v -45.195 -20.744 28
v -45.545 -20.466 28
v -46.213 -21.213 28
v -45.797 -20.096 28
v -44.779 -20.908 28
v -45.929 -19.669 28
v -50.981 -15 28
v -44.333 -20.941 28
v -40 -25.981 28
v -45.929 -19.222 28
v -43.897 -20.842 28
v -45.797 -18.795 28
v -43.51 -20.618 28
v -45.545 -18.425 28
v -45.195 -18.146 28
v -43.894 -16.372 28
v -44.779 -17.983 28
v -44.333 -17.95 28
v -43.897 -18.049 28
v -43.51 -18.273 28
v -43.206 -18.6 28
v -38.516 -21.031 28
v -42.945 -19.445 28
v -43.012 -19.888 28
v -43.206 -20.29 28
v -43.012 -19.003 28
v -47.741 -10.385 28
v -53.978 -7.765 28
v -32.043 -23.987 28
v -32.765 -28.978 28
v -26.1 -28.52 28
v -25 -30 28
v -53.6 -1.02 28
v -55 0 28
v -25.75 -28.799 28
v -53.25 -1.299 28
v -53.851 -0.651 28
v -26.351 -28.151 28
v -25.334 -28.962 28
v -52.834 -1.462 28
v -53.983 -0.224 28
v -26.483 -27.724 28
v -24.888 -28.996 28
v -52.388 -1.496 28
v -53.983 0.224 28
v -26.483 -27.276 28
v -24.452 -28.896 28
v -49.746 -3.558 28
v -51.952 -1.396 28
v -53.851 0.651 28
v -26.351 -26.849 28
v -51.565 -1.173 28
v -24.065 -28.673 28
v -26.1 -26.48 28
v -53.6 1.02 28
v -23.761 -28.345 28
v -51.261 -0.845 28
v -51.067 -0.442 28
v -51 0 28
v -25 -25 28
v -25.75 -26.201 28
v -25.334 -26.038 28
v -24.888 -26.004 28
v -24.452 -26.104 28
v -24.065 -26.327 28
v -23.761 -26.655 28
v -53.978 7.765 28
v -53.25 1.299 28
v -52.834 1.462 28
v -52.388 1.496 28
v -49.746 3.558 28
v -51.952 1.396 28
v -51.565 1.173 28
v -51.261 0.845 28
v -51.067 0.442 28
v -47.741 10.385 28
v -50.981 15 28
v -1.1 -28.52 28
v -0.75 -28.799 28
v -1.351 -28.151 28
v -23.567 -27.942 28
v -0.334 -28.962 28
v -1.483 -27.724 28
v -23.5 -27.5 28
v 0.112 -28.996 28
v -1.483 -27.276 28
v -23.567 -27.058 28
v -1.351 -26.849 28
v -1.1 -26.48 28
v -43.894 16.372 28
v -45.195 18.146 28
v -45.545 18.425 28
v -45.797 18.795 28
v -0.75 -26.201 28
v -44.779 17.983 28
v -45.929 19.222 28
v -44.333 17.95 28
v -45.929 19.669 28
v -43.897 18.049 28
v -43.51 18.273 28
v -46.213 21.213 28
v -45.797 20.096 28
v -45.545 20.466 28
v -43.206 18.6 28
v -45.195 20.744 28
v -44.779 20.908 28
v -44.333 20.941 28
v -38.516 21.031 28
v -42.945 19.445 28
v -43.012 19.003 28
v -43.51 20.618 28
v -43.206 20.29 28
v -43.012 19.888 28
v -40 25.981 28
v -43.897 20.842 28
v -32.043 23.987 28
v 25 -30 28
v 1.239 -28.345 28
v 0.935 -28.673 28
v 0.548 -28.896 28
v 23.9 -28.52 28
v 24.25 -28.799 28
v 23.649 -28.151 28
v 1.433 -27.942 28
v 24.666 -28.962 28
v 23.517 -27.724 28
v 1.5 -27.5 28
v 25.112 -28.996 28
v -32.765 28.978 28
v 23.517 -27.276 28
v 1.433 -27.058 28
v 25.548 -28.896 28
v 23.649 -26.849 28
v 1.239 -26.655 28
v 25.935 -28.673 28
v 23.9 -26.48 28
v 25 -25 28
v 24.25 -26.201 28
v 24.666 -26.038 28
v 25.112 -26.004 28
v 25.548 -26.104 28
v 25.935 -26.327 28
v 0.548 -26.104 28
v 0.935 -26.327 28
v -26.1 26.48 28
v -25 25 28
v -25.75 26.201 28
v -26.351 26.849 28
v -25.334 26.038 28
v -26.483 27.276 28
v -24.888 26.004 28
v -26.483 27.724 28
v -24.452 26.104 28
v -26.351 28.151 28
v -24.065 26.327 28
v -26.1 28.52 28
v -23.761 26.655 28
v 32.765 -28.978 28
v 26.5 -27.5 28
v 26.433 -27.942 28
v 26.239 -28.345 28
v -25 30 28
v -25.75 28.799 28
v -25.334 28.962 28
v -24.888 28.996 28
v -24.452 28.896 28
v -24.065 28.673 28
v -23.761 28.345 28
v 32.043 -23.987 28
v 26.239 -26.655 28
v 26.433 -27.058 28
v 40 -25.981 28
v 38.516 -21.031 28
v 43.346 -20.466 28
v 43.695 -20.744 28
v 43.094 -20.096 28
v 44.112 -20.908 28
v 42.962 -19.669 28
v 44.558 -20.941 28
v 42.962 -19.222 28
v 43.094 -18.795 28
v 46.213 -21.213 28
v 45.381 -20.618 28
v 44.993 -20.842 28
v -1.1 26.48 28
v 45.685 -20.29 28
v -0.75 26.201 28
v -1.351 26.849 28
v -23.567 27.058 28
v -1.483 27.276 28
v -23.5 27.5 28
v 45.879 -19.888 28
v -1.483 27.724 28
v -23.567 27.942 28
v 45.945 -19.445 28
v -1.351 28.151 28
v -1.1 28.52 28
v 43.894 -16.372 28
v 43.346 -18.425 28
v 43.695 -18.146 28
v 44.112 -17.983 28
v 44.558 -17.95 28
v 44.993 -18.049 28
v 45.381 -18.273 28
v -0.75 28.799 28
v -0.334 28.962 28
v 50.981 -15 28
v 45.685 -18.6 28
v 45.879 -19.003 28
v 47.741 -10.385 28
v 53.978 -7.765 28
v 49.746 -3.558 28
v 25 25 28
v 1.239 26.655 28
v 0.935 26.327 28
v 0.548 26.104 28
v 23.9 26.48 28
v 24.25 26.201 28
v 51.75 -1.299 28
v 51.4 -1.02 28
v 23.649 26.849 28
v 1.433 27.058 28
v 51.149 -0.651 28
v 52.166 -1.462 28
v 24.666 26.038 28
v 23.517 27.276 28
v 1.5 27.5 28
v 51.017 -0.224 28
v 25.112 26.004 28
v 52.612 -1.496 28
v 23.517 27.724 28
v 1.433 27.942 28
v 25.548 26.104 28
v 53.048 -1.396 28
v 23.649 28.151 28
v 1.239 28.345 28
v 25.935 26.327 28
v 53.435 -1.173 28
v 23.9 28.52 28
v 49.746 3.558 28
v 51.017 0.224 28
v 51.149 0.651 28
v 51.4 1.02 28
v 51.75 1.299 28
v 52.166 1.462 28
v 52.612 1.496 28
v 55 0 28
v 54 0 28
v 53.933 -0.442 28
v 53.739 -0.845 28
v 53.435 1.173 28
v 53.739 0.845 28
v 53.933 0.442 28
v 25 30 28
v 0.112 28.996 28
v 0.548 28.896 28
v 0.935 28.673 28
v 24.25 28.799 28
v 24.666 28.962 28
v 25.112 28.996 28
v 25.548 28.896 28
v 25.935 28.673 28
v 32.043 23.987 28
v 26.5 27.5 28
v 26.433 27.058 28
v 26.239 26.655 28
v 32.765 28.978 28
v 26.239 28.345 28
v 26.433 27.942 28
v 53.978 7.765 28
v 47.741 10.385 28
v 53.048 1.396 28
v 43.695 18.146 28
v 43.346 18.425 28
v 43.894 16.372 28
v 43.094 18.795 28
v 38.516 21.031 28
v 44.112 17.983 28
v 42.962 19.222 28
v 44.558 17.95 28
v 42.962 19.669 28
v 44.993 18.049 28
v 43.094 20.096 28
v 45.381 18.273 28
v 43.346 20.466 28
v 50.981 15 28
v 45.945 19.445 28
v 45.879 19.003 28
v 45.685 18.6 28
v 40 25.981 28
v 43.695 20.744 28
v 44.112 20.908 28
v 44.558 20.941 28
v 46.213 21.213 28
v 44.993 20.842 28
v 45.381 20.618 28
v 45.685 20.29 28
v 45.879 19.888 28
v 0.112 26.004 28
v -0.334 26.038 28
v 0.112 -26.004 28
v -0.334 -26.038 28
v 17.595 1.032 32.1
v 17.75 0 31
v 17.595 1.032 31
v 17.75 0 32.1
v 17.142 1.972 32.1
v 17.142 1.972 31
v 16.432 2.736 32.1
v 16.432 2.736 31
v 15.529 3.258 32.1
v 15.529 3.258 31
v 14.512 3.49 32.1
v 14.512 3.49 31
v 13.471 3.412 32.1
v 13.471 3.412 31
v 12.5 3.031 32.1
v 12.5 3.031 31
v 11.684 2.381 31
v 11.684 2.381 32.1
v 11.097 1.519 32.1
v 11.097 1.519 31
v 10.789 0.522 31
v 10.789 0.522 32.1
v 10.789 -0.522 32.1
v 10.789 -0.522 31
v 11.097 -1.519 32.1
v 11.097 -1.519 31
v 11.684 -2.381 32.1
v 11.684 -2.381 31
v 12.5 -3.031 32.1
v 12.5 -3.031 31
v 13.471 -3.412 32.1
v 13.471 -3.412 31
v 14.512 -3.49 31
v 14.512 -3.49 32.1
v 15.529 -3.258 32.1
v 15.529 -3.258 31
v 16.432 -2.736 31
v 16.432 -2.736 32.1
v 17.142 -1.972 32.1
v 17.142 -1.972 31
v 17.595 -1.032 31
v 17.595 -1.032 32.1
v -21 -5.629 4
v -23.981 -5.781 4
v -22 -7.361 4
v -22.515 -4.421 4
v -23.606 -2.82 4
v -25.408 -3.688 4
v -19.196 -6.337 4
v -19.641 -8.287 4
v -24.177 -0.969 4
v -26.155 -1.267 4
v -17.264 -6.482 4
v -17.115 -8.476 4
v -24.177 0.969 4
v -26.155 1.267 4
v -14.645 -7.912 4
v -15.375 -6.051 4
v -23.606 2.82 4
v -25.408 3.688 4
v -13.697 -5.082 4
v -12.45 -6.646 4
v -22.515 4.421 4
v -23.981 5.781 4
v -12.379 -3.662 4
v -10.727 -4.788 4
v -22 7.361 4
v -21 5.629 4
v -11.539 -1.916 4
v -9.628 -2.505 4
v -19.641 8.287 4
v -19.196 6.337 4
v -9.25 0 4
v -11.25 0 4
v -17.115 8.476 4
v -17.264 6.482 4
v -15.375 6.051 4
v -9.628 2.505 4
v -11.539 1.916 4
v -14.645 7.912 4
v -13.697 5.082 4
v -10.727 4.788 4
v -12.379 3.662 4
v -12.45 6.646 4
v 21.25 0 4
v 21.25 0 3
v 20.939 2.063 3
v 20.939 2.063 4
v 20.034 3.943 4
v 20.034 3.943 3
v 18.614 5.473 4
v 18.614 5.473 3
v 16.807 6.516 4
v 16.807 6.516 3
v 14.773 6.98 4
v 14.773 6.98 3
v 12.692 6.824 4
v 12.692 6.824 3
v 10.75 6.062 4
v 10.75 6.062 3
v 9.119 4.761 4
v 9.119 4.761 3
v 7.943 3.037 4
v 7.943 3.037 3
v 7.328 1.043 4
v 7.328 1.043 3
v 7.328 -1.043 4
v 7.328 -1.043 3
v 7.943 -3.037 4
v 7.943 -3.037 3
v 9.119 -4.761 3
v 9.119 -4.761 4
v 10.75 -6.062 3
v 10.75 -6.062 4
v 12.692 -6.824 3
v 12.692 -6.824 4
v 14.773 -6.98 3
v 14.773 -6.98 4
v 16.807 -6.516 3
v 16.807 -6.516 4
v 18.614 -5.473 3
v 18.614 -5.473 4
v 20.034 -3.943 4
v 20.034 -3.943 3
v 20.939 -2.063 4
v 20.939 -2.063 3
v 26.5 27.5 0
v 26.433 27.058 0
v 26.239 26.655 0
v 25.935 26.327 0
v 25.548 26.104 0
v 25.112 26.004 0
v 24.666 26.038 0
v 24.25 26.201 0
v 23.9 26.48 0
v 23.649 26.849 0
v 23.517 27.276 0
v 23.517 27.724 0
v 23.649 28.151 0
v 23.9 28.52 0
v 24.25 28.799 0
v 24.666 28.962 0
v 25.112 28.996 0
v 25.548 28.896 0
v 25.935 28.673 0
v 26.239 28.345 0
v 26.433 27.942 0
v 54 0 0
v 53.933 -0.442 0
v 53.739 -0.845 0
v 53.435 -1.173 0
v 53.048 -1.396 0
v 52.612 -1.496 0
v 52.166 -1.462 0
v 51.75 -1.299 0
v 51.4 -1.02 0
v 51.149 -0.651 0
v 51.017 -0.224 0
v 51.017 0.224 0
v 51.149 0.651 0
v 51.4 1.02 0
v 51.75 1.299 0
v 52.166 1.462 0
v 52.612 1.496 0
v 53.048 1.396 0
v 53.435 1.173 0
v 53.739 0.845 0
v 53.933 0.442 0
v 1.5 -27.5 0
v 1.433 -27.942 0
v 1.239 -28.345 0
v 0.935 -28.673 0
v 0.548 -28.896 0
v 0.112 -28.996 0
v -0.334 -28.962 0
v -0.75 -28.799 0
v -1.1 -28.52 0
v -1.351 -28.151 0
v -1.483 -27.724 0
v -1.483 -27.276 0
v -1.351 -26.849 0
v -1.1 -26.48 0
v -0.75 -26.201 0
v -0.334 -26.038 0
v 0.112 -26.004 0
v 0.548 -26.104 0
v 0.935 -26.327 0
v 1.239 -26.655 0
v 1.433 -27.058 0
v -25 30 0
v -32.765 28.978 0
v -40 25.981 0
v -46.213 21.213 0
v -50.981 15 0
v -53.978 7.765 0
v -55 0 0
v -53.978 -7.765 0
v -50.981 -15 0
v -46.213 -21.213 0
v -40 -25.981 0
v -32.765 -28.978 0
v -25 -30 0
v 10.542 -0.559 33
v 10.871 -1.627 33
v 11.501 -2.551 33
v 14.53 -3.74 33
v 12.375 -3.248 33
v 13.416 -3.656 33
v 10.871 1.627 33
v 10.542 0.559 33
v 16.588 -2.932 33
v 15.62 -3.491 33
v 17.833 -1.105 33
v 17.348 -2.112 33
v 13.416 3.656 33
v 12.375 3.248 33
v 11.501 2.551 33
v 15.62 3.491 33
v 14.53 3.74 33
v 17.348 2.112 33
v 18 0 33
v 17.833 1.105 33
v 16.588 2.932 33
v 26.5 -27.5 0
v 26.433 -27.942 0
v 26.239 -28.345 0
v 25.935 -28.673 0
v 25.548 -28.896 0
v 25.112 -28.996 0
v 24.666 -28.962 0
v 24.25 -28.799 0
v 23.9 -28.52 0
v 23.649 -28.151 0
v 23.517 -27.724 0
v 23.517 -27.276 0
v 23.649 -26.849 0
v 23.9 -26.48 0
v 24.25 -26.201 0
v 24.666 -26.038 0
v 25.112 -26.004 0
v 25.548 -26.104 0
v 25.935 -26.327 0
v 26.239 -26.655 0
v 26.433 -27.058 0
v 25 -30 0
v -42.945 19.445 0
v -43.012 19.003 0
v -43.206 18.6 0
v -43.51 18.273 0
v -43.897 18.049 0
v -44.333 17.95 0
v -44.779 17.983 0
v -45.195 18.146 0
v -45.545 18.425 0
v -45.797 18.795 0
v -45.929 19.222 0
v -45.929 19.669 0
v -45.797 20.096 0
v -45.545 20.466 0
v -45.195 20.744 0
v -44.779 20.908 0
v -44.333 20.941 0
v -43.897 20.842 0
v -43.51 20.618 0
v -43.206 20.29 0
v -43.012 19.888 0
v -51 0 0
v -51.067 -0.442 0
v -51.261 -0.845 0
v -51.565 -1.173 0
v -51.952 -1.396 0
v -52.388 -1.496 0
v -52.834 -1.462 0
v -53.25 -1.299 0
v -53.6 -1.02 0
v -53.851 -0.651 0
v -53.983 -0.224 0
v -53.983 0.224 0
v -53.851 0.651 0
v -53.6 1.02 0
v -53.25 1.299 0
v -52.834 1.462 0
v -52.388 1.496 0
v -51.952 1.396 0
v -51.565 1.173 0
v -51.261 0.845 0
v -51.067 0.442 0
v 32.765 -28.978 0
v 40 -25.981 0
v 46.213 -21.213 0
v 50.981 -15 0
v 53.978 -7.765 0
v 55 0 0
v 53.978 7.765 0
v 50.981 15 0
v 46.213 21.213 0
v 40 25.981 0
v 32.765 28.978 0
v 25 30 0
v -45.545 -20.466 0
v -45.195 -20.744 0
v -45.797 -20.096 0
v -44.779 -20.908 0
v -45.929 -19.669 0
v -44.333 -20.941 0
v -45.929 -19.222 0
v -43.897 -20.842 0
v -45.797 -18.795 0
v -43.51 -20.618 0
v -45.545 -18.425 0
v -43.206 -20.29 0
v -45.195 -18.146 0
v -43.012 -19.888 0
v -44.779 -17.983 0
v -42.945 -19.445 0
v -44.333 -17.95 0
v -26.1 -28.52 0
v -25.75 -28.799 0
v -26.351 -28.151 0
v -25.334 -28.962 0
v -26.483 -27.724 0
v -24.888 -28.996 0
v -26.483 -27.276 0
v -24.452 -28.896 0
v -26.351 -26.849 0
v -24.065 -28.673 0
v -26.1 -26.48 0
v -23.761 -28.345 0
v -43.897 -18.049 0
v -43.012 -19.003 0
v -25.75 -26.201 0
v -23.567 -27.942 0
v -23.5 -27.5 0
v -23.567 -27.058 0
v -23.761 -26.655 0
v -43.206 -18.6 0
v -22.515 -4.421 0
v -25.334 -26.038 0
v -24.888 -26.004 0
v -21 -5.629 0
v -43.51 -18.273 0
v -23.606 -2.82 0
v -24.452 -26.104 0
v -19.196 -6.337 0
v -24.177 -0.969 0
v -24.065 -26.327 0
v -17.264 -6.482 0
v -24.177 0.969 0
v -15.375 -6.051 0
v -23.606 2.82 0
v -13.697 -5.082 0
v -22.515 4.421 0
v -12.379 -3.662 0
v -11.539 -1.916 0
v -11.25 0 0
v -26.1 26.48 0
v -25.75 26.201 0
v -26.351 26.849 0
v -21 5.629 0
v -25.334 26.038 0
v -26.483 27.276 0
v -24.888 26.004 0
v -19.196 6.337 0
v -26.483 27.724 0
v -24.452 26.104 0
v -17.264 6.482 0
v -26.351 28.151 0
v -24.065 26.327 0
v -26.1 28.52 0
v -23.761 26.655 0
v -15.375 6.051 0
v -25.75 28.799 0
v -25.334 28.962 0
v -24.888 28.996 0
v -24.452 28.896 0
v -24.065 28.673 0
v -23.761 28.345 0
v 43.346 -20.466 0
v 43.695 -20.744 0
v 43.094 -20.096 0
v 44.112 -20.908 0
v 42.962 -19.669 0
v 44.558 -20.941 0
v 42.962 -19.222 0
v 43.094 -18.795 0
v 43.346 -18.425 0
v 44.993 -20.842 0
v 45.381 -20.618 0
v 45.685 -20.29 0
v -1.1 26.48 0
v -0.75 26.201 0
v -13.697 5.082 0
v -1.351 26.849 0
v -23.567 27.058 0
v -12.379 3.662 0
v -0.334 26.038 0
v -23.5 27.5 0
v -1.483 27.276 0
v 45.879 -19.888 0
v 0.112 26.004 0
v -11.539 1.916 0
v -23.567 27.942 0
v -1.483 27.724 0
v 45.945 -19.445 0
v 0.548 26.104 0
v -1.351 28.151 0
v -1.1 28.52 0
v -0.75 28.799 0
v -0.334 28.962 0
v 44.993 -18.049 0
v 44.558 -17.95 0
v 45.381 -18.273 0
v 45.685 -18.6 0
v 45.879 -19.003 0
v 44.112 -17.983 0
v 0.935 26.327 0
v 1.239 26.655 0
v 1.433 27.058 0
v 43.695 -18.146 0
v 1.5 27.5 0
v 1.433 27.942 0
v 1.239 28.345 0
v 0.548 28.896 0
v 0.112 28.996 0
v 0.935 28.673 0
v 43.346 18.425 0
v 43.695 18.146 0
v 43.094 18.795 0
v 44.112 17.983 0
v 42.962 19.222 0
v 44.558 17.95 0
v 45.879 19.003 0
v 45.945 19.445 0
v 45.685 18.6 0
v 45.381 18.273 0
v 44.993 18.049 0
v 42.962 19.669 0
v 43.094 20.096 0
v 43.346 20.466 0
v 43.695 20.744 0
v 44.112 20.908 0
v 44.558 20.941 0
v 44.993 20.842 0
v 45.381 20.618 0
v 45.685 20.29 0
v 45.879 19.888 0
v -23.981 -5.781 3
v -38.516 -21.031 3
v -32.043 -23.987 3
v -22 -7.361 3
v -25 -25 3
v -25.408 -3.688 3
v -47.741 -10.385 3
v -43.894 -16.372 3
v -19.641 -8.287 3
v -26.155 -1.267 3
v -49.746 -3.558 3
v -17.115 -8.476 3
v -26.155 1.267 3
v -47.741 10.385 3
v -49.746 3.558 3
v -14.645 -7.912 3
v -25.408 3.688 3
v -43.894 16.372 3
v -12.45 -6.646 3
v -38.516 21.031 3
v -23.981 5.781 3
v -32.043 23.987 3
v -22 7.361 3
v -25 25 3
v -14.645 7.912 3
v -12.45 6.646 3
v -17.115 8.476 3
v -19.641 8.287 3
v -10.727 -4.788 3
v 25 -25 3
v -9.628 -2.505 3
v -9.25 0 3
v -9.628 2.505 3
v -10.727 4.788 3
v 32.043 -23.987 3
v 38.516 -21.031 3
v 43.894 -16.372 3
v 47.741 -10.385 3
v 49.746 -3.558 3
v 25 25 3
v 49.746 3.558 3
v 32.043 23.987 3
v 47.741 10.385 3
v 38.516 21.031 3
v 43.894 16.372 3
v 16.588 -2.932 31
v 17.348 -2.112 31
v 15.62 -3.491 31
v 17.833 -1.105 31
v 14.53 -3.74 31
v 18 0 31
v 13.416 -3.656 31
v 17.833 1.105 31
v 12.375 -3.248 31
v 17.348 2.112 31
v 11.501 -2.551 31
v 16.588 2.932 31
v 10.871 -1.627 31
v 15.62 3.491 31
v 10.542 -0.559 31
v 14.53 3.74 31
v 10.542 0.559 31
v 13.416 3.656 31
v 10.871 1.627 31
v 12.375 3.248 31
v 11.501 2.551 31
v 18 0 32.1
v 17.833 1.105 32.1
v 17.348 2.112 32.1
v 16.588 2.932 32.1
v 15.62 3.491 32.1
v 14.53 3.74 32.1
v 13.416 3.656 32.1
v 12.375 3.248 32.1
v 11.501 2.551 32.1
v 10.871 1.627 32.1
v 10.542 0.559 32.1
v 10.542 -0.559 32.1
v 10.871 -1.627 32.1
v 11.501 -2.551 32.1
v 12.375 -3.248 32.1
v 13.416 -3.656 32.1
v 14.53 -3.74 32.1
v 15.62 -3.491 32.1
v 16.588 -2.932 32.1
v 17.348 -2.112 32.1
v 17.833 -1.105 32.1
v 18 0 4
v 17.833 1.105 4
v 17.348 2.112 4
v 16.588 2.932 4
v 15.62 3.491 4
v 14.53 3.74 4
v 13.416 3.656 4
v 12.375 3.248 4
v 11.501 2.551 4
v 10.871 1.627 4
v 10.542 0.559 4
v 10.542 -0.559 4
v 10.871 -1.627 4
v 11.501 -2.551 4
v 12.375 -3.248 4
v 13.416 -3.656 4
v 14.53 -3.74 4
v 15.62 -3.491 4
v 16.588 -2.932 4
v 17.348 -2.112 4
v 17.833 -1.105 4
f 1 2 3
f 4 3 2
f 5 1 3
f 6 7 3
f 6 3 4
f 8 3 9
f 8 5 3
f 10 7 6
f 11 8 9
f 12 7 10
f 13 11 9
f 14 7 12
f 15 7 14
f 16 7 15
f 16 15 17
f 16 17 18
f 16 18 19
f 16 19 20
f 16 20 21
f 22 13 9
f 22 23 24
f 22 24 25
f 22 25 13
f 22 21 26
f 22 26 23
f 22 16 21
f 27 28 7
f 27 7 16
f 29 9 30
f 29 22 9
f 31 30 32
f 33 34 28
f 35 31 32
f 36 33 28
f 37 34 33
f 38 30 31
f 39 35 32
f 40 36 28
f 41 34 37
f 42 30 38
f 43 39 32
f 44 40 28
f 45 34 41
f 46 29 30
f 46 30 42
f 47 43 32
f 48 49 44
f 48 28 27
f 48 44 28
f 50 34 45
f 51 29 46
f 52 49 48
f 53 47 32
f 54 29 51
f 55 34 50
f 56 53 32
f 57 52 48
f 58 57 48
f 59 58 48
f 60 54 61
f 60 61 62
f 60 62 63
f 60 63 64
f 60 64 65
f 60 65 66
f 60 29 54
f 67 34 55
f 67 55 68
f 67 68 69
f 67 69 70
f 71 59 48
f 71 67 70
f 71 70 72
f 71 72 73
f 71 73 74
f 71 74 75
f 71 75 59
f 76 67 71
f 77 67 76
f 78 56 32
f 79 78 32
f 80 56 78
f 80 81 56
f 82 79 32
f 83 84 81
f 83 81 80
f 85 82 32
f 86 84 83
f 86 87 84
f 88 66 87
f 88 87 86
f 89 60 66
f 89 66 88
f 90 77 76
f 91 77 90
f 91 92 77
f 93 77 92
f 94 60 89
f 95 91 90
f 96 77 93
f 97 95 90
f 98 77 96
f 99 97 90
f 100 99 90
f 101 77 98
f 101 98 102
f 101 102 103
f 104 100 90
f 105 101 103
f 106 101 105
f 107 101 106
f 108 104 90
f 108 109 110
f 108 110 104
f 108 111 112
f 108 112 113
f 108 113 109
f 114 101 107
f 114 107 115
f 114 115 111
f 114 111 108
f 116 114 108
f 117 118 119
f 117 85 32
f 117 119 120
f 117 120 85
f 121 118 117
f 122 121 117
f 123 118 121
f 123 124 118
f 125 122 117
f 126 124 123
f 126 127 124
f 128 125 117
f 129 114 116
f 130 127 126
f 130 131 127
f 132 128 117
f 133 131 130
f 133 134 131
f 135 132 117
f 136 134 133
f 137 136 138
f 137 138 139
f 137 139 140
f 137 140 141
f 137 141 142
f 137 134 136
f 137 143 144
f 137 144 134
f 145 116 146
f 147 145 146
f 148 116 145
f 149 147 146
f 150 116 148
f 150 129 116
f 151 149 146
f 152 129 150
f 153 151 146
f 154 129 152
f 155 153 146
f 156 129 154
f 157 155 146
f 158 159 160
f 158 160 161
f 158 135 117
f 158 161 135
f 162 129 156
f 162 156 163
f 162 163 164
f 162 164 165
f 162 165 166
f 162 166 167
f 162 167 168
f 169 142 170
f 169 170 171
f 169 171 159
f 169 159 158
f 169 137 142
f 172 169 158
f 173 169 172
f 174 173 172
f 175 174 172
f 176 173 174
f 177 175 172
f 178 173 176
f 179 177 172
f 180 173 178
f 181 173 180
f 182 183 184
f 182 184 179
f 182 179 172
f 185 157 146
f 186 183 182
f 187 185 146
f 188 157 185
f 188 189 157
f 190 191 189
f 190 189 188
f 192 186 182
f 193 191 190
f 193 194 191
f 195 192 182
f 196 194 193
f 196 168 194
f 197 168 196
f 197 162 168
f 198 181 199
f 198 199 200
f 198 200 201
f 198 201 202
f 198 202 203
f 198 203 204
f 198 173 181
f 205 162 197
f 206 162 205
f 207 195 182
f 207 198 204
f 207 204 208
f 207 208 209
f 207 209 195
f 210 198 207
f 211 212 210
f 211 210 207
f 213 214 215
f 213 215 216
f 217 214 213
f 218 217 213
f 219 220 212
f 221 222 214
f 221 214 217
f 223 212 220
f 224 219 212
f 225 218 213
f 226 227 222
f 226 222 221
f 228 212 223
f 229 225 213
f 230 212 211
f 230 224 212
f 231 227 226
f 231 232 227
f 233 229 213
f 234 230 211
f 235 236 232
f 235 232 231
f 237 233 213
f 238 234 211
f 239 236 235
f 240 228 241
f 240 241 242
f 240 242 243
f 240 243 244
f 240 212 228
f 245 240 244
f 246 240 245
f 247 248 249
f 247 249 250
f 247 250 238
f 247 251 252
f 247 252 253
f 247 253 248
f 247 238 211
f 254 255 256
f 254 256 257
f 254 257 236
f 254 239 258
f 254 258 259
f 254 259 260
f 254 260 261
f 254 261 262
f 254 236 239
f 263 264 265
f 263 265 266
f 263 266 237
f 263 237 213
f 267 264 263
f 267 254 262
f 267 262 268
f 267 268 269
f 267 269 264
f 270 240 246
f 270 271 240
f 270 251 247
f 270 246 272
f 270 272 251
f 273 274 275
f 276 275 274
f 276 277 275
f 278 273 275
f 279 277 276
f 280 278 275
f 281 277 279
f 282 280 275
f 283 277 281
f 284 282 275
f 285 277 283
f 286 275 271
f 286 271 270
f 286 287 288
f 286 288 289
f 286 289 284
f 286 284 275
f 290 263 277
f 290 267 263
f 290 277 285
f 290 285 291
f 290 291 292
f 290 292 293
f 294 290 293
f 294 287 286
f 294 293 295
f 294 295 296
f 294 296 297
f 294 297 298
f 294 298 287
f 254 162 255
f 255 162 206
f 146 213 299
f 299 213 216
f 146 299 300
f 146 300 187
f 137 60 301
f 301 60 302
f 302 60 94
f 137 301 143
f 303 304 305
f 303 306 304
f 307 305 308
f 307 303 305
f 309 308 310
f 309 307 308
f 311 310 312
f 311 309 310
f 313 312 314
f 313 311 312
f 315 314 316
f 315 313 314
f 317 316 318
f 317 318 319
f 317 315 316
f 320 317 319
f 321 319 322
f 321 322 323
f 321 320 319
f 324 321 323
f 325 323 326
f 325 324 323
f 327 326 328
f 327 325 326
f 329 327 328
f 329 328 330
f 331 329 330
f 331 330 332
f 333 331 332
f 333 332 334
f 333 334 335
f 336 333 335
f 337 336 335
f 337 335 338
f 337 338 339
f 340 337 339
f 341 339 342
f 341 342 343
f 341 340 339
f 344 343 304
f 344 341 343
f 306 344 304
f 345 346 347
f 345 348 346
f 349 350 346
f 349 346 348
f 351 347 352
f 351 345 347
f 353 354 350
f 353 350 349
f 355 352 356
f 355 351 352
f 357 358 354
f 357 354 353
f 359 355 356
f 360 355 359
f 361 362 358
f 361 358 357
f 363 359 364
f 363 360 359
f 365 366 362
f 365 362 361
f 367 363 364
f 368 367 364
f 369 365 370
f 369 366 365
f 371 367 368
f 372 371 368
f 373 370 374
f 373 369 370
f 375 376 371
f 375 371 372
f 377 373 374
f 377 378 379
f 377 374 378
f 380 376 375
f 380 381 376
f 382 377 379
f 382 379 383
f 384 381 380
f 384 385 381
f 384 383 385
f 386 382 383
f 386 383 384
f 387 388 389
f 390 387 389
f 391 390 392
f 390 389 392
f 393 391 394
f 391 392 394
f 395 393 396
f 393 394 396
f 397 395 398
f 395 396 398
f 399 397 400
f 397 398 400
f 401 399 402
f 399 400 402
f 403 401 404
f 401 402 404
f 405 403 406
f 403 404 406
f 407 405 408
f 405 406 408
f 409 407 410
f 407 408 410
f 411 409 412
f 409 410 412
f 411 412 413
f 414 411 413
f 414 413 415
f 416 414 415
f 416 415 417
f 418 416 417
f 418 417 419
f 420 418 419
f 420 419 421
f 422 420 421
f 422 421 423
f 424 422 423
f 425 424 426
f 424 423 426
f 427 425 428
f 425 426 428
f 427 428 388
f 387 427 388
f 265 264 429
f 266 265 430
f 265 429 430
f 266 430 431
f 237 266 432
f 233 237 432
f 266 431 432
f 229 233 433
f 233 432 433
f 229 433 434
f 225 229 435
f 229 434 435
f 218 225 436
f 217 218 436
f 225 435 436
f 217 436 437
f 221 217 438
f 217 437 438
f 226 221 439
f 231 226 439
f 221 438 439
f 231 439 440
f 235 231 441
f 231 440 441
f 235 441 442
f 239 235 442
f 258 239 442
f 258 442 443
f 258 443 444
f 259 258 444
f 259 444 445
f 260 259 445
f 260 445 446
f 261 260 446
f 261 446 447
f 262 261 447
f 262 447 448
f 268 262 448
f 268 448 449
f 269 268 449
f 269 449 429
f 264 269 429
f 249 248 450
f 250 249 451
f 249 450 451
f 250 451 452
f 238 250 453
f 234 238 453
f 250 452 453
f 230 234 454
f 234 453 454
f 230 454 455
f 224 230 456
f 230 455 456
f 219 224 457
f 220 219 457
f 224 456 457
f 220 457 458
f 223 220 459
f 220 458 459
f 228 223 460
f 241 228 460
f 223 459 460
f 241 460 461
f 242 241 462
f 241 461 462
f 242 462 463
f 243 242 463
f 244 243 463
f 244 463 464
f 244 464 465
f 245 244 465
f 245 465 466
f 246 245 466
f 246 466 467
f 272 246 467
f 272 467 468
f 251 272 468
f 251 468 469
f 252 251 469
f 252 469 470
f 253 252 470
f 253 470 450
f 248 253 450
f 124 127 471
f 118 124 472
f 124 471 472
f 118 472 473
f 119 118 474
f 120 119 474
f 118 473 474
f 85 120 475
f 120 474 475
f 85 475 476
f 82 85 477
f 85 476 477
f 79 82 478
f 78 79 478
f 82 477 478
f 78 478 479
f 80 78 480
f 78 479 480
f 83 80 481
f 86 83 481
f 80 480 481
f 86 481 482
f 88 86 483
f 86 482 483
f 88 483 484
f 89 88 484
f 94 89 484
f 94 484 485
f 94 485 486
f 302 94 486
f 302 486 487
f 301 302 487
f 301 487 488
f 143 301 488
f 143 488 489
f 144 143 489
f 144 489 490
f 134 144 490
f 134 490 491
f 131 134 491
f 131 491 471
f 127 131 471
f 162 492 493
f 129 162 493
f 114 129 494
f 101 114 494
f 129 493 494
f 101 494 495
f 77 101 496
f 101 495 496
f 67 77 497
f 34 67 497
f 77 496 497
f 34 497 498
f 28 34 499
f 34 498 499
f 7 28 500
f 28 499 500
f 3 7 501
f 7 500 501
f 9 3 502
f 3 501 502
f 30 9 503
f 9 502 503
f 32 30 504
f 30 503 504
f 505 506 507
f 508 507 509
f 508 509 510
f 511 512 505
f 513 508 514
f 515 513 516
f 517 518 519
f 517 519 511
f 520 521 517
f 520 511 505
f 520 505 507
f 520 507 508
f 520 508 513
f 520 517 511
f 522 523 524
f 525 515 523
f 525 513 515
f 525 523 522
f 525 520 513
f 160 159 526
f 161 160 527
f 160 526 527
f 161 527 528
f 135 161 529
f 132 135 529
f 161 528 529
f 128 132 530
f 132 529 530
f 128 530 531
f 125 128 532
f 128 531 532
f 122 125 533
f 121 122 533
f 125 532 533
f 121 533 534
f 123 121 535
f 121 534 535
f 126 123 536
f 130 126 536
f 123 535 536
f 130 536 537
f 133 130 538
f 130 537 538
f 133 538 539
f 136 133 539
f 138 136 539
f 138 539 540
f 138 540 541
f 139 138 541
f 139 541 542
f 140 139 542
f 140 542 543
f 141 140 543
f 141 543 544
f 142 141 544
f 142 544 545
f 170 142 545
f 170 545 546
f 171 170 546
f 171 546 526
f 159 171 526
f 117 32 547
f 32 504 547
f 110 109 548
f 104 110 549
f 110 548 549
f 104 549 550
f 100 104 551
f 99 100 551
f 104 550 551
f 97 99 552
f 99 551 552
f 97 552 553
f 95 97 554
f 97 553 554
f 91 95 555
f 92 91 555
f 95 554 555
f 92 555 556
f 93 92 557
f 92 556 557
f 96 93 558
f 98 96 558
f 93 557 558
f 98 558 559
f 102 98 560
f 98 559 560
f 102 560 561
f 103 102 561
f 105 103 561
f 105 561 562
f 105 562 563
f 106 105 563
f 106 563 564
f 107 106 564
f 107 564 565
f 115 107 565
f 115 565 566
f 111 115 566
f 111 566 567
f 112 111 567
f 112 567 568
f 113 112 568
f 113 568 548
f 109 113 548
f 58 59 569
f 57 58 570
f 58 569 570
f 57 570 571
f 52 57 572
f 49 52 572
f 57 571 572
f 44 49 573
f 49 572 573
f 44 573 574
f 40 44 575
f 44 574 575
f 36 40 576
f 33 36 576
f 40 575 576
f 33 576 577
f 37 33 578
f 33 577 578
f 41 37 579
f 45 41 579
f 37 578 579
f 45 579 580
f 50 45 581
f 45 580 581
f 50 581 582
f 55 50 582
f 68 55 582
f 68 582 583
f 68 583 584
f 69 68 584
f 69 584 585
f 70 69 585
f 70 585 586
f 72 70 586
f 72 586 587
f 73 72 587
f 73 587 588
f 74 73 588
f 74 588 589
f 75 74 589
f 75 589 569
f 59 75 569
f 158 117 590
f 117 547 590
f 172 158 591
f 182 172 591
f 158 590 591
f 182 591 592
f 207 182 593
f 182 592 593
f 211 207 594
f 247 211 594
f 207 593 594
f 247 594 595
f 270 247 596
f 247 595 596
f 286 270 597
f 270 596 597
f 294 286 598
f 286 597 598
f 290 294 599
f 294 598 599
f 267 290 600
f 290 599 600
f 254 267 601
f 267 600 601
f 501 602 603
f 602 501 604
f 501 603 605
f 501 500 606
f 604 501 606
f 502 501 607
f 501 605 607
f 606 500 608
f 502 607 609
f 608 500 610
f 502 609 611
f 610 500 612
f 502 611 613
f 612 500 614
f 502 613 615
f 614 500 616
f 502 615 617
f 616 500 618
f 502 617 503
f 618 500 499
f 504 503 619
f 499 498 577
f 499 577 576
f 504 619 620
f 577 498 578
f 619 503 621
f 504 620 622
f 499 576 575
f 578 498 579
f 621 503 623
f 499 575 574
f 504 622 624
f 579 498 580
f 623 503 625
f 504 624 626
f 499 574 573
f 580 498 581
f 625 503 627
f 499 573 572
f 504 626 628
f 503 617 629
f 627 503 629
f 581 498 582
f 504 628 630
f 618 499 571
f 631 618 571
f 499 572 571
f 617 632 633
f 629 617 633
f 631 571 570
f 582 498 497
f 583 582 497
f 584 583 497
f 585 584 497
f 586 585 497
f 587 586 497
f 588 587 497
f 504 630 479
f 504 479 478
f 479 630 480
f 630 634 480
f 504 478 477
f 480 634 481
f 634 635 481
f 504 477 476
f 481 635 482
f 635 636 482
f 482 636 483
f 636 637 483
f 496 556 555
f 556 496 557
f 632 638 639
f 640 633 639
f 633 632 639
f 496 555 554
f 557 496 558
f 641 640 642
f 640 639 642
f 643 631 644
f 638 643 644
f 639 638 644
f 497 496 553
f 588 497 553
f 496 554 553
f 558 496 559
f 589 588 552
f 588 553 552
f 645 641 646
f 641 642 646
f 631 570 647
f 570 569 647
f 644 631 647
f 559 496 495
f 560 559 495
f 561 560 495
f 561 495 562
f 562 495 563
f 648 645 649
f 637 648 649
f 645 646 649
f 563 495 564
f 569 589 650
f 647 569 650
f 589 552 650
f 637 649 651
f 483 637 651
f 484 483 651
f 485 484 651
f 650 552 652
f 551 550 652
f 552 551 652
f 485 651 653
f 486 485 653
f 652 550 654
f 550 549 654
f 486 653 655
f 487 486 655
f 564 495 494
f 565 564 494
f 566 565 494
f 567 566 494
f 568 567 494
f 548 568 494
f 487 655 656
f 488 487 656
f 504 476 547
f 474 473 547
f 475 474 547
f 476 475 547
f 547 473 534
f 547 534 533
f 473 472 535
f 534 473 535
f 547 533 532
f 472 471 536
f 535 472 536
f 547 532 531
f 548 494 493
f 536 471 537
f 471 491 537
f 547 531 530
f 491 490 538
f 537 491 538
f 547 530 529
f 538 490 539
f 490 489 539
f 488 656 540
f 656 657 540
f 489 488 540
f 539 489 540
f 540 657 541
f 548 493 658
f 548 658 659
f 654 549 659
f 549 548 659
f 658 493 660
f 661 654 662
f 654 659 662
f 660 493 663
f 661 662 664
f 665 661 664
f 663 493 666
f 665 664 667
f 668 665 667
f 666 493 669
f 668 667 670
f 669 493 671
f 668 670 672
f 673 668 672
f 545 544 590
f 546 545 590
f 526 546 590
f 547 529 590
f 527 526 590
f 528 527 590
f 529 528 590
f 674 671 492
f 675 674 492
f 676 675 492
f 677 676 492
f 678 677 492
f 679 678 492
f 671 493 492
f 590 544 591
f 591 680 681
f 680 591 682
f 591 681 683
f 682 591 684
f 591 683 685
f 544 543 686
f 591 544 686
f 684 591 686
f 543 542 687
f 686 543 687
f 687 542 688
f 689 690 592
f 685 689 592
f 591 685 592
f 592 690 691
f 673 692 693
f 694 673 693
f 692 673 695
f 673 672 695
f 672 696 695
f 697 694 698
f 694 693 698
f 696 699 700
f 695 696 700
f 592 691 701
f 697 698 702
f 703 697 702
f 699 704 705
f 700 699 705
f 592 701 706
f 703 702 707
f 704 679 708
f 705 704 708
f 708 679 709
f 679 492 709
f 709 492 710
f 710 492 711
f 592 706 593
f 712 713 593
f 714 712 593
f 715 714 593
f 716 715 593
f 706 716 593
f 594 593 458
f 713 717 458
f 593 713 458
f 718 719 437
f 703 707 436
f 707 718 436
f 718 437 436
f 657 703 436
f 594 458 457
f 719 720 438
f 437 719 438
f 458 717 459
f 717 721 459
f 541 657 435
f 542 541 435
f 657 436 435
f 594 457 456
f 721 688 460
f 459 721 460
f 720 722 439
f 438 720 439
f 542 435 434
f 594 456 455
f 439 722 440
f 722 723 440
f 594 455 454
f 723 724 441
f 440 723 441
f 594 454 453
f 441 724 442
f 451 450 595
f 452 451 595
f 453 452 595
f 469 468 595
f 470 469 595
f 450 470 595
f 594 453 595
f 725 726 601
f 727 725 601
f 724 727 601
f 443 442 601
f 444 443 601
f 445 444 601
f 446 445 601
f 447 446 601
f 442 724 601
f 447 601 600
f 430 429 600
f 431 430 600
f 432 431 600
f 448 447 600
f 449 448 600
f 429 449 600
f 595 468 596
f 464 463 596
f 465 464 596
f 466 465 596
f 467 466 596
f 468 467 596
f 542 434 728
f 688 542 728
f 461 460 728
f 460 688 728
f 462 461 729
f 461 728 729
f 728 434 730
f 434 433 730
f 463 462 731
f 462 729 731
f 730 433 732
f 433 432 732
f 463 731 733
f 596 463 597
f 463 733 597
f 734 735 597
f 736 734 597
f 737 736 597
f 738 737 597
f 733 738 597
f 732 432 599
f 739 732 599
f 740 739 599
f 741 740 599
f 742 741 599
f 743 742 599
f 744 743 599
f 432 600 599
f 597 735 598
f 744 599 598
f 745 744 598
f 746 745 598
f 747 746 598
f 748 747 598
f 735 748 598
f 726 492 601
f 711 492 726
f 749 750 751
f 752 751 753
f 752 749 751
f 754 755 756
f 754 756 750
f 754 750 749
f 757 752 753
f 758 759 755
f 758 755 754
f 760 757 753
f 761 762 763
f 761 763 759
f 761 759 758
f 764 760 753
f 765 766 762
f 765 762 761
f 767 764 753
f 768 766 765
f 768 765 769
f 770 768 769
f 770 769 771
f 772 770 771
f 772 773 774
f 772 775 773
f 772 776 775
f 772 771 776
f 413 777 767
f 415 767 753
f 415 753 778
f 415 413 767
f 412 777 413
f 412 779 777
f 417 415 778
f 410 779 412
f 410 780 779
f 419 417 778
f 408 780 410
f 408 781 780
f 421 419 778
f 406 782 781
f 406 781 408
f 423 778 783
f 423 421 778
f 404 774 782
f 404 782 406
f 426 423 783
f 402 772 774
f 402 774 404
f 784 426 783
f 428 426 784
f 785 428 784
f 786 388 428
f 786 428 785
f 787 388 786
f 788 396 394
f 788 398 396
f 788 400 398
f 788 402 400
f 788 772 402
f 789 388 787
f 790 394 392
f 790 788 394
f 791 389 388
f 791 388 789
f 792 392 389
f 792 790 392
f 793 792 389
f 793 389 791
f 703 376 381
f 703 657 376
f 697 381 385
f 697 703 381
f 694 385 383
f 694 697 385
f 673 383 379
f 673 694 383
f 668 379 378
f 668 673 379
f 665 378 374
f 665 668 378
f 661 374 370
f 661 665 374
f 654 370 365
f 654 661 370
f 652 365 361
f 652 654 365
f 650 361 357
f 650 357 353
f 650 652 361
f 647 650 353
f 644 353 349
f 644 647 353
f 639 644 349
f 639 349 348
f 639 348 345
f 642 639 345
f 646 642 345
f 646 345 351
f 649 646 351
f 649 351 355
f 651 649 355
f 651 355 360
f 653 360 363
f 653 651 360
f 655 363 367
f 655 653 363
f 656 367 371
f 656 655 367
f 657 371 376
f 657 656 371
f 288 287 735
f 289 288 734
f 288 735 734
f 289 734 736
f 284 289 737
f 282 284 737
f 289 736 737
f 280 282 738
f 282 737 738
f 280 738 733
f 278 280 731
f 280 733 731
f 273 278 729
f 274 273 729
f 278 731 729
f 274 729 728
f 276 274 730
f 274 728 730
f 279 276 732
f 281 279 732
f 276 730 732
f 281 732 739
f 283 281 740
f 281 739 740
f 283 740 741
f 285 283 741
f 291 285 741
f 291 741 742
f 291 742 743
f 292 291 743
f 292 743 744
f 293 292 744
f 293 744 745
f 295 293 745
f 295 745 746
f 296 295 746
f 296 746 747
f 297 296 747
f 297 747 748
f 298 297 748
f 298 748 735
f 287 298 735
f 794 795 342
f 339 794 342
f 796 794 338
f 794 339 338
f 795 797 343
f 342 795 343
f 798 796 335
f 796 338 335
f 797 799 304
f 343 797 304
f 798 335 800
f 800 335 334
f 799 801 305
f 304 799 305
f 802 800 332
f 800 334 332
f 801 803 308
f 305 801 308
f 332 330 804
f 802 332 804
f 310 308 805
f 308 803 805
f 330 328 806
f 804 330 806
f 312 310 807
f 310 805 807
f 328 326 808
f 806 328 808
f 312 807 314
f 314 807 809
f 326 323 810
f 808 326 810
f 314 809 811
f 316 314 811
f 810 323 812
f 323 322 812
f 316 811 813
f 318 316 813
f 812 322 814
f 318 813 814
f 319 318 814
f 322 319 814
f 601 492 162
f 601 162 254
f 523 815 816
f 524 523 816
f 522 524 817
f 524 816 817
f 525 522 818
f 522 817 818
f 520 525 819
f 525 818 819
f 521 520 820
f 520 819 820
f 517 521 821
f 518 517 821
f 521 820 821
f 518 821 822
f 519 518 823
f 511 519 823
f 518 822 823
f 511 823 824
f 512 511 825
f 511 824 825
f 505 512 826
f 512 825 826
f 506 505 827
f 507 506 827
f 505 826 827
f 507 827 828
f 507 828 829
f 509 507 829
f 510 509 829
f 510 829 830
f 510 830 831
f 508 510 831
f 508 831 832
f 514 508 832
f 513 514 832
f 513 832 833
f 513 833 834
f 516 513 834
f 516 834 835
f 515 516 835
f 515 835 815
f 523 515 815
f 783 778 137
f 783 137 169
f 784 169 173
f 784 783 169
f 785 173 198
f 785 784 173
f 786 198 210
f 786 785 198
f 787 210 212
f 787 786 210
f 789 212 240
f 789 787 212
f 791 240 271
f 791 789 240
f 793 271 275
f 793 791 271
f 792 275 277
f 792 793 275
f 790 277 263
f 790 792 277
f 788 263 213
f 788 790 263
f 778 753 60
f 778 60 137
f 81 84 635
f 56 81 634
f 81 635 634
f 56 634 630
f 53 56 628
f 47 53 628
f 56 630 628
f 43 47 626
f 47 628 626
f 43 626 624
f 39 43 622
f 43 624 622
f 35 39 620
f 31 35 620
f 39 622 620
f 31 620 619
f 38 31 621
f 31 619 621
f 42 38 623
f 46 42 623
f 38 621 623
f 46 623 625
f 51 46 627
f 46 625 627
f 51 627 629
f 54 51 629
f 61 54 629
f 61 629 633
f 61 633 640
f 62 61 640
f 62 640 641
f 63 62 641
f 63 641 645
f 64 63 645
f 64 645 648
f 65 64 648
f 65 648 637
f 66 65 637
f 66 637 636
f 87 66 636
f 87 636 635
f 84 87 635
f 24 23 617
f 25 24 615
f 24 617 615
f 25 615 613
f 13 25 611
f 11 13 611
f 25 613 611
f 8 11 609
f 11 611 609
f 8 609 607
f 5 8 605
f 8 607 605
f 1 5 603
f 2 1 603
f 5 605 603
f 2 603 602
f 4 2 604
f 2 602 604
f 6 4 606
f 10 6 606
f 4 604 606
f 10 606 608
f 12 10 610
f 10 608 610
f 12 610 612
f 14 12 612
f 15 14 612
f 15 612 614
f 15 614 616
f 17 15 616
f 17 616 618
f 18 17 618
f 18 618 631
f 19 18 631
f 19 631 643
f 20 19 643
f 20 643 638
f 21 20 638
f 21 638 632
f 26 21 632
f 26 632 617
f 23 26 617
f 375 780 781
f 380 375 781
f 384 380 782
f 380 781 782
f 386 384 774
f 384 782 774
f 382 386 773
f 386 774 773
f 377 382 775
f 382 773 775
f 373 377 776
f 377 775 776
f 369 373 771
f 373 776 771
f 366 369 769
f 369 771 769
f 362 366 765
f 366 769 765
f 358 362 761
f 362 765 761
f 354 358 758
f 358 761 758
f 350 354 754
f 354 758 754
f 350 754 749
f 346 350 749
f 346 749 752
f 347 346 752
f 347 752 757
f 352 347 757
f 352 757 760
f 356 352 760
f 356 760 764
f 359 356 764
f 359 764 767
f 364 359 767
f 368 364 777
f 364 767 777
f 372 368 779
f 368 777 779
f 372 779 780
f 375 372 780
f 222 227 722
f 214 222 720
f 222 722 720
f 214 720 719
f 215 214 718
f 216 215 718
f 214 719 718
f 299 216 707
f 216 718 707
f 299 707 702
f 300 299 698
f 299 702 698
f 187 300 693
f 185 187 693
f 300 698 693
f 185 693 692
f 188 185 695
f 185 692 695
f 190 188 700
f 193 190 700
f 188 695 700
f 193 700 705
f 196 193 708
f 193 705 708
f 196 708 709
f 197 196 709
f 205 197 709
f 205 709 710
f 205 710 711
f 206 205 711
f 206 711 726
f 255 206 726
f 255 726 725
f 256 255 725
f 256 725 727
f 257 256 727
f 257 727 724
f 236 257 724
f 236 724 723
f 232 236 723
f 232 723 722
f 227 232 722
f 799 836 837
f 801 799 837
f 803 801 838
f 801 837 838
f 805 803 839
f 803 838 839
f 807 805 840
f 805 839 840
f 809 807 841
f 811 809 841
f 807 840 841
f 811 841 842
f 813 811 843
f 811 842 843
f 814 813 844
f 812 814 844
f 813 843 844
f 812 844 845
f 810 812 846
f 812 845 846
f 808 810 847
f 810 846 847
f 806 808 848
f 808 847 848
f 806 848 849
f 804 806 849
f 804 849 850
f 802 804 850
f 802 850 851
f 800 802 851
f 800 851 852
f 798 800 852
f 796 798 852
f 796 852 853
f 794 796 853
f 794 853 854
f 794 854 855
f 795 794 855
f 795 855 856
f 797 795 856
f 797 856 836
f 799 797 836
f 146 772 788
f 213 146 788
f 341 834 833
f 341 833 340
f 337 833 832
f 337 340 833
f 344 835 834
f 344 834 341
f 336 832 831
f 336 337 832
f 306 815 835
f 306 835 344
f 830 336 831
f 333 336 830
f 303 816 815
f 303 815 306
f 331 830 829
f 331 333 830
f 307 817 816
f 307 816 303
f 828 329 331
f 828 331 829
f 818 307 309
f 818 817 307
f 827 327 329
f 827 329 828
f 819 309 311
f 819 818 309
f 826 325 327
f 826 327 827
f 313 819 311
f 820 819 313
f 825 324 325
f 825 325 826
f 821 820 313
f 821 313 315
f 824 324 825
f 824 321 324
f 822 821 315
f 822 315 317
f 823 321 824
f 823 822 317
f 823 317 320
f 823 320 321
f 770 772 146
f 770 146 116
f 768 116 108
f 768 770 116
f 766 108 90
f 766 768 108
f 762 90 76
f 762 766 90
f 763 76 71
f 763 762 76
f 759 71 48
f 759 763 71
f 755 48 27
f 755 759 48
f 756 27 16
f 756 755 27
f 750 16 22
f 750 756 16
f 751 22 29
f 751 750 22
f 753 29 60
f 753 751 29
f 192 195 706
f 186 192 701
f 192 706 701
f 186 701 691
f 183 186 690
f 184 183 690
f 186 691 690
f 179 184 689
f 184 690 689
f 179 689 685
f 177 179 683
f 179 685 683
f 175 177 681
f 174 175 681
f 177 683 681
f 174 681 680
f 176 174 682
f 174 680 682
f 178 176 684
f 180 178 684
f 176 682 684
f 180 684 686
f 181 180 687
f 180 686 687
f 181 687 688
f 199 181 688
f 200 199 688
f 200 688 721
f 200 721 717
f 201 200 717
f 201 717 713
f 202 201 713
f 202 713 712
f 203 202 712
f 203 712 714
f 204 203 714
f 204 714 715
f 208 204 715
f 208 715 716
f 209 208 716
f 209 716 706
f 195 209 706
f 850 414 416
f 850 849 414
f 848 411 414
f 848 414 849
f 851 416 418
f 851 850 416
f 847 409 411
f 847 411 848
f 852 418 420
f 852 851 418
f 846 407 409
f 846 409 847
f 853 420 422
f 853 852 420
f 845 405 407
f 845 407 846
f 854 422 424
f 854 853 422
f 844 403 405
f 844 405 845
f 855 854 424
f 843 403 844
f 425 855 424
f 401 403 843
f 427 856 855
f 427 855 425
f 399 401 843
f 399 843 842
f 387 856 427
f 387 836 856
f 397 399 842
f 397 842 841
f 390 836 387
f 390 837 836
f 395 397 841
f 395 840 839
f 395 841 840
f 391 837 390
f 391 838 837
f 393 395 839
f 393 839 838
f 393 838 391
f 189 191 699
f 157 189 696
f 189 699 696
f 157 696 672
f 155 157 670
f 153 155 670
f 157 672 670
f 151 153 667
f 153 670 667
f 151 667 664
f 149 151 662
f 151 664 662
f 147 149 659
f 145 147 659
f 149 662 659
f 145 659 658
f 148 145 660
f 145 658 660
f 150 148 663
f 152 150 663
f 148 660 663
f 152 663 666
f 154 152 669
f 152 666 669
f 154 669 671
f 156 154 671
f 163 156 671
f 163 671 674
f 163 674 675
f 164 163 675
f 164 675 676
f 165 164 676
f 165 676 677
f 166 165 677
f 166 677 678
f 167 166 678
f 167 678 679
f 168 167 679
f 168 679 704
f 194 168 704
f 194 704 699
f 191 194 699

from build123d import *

# Parameters (mm, degrees)
SKETCH_R      = 6.5
PAD_DEPTH     = 3
PAD001_DEPTH  = 25
SKETCH002_R   = 8.5
SKETCH002_R_2 = 6.5
PAD002_DEPTH  = 1
SKETCH003_R   = 7
PAD003_DEPTH  = 1
SKETCH004_R   = 3.75
PAD004_DEPTH  = 29
SKETCH005_W   = 0.25
SKETCH005_H   = 1.1
SKETCH006_R   = 1.5
POCKET_DEPTH  = 50


with BuildPart() as part:
    # Sketch → Pad (new body)
    with BuildSketch(Plane.XY):
        with BuildLine():
            ThreePointArc((-25, 30), (-55, 0), (-25, -30))
            Line((-25, -30), (25, -30))
            ThreePointArc((25, -30), (55, 0), (25, 30))
            Line((-25, 30), (25, 30))
        make_face()
        with Locations((-17.75, 0)):
            Circle(SKETCH_R, mode=Mode.SUBTRACT)
    extrude(amount=PAD_DEPTH)

    # Sketch001 (on Face7 of Pad) → Pad001 (join)
    with BuildSketch(Plane.XY.offset(3)):
        with BuildLine():
            ThreePointArc((-25, 30), (-55, 0), (-25, -30))
            Line((-25, -30), (25, -30))
            ThreePointArc((25, -30), (55, 0), (25, 30))
            Line((-25, 30), (25, 30))
        make_face()
        with BuildLine():
            ThreePointArc((-25, 25), (-50, 0), (-25, -25))
            Line((-25, -25), (25, -25))
            ThreePointArc((25, -25), (50, 0), (25, 25))
            Line((-25, 25), (25, 25))
        make_face(mode=Mode.SUBTRACT)
    extrude(amount=PAD001_DEPTH)

    # Sketch002 (on Face11 of Pad001) → Pad002 (join)
    with BuildSketch(Plane.XY.offset(3)):
        with Locations((-17.75, 0)):
            Circle(SKETCH002_R)
        with Locations((-17.75, 0)):
            Circle(SKETCH002_R_2, mode=Mode.SUBTRACT)
    extrude(amount=PAD002_DEPTH)

    # Sketch003 (on Face19 of Pad002) → Pad003 (join)
    with BuildSketch(Plane.XY.offset(3)):
        with Locations((14.25, 0)):
            Circle(SKETCH003_R)
    extrude(amount=PAD003_DEPTH)

    # Sketch004 (on Face21 of Pad003) → Pad004 (join)
    with BuildSketch(Plane.XY.offset(4)):
        with Locations((14.25, 0)):
            Circle(SKETCH004_R)
    extrude(amount=PAD004_DEPTH)

    # Sketch005 (on DatumPlane) → Groove (revolve, cut)
    with BuildSketch(Plane(origin=(14.25, 0, 18.5), x_dir=(1, 0, 0), z_dir=(0, -1, 0))):
        with Locations((3.625, 13.05)):
            Rectangle(SKETCH005_W, SKETCH005_H)
    revolve(axis=Axis((14.25, 0, 18.5), (0, 0, 1)), mode=Mode.SUBTRACT)

    # Sketch006 (on Face1 of Groove) → Pocket (cut)
    with BuildSketch(Plane(origin=(0, 0, 0), x_dir=(1, 0, 0), z_dir=(0, 0, -1))):
        with Locations((-44.445436, 19.445436)):
            Circle(SKETCH006_R)
        with Locations((44.445436, 19.445436)):
            Circle(SKETCH006_R)
        with Locations((-44.445436, -19.445436)):
            Circle(SKETCH006_R)
        with Locations((44.445436, -19.445436)):
            Circle(SKETCH006_R)
        with Locations((-25, 27.5)):
            Circle(SKETCH006_R)
        with Locations((0, 27.5)):
            Circle(SKETCH006_R)
        with Locations((25, 27.5)):
            Circle(SKETCH006_R)
        with Locations((52.5, 0)):
            Circle(SKETCH006_R)
        with Locations((25, -27.5)):
            Circle(SKETCH006_R)
        with Locations((0, -27.5)):
            Circle(SKETCH006_R)
        with Locations((-25, -27.5)):
            Circle(SKETCH006_R)
        with Locations((-52.5, 0)):
            Circle(SKETCH006_R)
    extrude(amount=-POCKET_DEPTH, mode=Mode.SUBTRACT)


solid = part.part
